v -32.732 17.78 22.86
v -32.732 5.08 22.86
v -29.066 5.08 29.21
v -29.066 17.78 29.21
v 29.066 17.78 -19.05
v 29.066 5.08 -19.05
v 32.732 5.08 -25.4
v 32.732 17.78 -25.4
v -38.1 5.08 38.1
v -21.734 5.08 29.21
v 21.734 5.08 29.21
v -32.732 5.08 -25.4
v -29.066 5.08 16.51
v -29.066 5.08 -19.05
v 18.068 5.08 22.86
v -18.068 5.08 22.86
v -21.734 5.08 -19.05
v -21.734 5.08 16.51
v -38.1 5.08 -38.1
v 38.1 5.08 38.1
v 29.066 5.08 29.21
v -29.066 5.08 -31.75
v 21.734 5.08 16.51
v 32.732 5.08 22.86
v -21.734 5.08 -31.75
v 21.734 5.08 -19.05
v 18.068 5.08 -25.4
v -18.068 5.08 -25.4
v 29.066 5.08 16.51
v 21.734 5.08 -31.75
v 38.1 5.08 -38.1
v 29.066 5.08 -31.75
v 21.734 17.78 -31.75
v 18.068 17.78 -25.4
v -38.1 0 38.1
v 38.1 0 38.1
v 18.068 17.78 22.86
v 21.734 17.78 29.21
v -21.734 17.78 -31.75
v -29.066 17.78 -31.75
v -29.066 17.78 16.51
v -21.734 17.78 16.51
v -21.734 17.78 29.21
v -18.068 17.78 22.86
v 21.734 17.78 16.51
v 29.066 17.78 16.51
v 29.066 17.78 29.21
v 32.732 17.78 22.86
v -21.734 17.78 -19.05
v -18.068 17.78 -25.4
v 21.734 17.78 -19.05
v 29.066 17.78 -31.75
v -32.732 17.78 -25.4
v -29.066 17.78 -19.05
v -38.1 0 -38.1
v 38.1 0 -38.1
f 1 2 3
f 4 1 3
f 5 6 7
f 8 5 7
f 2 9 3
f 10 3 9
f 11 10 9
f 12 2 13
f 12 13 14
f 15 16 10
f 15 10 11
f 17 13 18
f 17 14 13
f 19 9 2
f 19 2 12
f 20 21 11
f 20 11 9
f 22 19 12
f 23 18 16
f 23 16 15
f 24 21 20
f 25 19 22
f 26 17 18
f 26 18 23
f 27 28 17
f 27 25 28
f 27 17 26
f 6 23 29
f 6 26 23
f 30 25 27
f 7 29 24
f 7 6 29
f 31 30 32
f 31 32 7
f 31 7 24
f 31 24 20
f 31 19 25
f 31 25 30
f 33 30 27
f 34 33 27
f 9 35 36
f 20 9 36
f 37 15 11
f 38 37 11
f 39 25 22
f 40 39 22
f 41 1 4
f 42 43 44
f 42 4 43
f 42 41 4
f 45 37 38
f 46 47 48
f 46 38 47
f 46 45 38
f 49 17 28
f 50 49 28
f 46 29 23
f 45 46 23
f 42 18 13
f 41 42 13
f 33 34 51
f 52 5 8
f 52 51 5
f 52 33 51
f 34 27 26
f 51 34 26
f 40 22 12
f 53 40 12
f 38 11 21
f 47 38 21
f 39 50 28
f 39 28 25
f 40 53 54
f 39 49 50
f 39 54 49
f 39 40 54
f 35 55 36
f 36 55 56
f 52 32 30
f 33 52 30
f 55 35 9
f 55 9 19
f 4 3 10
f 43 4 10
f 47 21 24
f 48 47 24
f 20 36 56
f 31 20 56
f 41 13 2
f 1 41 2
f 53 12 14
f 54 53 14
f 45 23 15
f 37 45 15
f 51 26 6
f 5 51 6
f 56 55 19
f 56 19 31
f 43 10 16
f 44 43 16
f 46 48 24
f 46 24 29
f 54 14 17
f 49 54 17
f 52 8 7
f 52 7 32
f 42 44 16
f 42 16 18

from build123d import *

# Parameters (mm, degrees)
SKETCH1_W            = 76.2
SKETCH1_H            = 76.2
BOSS_EXTRUDE1_DEPTH  = 5.08
BOSS_EXTRUDE2_DEPTH  = 12.7
LPATTERN1_COUNT      = 2
LPATTERN1_PITCH      = 50.8
LPATTERN1_COUNT_DIR2 = 2
LPATTERN1_PITCH_DIR2 = 48.26


with BuildPart() as part:
    # Sketch1 → Boss-Extrude1 (new body)
    with BuildSketch(Plane(origin=(0, 0, 0), x_dir=(1, 0, 0), z_dir=(0, 1, 0))):
        Rectangle(SKETCH1_W, SKETCH1_H)
    extrude(amount=BOSS_EXTRUDE1_DEPTH)

    # Sketch2 → Boss-Extrude2 (add)
    with BuildSketch(Plane(origin=(0, 5.08, 0), x_dir=(1, 0, 0), z_dir=(0, 1, 0))):
        Polygon((-21.733825791, 19.05), (-18.067651581, 25.4), (-21.733825791, 31.75), (-29.066174209, 31.75), (-32.732348419, 25.4), (-29.066174209, 19.05), align=None)
    boss_extrude2 = extrude(amount=BOSS_EXTRUDE2_DEPTH)

    # LPattern1: Boss-Extrude2 2 × 2
    with Locations(*[(i * LPATTERN1_PITCH, 0, j * LPATTERN1_PITCH_DIR2) for i in range(LPATTERN1_COUNT) for j in range(LPATTERN1_COUNT_DIR2) if (i, j) != (0, 0)]):
        add(boss_extrude2)


solid = part.part
